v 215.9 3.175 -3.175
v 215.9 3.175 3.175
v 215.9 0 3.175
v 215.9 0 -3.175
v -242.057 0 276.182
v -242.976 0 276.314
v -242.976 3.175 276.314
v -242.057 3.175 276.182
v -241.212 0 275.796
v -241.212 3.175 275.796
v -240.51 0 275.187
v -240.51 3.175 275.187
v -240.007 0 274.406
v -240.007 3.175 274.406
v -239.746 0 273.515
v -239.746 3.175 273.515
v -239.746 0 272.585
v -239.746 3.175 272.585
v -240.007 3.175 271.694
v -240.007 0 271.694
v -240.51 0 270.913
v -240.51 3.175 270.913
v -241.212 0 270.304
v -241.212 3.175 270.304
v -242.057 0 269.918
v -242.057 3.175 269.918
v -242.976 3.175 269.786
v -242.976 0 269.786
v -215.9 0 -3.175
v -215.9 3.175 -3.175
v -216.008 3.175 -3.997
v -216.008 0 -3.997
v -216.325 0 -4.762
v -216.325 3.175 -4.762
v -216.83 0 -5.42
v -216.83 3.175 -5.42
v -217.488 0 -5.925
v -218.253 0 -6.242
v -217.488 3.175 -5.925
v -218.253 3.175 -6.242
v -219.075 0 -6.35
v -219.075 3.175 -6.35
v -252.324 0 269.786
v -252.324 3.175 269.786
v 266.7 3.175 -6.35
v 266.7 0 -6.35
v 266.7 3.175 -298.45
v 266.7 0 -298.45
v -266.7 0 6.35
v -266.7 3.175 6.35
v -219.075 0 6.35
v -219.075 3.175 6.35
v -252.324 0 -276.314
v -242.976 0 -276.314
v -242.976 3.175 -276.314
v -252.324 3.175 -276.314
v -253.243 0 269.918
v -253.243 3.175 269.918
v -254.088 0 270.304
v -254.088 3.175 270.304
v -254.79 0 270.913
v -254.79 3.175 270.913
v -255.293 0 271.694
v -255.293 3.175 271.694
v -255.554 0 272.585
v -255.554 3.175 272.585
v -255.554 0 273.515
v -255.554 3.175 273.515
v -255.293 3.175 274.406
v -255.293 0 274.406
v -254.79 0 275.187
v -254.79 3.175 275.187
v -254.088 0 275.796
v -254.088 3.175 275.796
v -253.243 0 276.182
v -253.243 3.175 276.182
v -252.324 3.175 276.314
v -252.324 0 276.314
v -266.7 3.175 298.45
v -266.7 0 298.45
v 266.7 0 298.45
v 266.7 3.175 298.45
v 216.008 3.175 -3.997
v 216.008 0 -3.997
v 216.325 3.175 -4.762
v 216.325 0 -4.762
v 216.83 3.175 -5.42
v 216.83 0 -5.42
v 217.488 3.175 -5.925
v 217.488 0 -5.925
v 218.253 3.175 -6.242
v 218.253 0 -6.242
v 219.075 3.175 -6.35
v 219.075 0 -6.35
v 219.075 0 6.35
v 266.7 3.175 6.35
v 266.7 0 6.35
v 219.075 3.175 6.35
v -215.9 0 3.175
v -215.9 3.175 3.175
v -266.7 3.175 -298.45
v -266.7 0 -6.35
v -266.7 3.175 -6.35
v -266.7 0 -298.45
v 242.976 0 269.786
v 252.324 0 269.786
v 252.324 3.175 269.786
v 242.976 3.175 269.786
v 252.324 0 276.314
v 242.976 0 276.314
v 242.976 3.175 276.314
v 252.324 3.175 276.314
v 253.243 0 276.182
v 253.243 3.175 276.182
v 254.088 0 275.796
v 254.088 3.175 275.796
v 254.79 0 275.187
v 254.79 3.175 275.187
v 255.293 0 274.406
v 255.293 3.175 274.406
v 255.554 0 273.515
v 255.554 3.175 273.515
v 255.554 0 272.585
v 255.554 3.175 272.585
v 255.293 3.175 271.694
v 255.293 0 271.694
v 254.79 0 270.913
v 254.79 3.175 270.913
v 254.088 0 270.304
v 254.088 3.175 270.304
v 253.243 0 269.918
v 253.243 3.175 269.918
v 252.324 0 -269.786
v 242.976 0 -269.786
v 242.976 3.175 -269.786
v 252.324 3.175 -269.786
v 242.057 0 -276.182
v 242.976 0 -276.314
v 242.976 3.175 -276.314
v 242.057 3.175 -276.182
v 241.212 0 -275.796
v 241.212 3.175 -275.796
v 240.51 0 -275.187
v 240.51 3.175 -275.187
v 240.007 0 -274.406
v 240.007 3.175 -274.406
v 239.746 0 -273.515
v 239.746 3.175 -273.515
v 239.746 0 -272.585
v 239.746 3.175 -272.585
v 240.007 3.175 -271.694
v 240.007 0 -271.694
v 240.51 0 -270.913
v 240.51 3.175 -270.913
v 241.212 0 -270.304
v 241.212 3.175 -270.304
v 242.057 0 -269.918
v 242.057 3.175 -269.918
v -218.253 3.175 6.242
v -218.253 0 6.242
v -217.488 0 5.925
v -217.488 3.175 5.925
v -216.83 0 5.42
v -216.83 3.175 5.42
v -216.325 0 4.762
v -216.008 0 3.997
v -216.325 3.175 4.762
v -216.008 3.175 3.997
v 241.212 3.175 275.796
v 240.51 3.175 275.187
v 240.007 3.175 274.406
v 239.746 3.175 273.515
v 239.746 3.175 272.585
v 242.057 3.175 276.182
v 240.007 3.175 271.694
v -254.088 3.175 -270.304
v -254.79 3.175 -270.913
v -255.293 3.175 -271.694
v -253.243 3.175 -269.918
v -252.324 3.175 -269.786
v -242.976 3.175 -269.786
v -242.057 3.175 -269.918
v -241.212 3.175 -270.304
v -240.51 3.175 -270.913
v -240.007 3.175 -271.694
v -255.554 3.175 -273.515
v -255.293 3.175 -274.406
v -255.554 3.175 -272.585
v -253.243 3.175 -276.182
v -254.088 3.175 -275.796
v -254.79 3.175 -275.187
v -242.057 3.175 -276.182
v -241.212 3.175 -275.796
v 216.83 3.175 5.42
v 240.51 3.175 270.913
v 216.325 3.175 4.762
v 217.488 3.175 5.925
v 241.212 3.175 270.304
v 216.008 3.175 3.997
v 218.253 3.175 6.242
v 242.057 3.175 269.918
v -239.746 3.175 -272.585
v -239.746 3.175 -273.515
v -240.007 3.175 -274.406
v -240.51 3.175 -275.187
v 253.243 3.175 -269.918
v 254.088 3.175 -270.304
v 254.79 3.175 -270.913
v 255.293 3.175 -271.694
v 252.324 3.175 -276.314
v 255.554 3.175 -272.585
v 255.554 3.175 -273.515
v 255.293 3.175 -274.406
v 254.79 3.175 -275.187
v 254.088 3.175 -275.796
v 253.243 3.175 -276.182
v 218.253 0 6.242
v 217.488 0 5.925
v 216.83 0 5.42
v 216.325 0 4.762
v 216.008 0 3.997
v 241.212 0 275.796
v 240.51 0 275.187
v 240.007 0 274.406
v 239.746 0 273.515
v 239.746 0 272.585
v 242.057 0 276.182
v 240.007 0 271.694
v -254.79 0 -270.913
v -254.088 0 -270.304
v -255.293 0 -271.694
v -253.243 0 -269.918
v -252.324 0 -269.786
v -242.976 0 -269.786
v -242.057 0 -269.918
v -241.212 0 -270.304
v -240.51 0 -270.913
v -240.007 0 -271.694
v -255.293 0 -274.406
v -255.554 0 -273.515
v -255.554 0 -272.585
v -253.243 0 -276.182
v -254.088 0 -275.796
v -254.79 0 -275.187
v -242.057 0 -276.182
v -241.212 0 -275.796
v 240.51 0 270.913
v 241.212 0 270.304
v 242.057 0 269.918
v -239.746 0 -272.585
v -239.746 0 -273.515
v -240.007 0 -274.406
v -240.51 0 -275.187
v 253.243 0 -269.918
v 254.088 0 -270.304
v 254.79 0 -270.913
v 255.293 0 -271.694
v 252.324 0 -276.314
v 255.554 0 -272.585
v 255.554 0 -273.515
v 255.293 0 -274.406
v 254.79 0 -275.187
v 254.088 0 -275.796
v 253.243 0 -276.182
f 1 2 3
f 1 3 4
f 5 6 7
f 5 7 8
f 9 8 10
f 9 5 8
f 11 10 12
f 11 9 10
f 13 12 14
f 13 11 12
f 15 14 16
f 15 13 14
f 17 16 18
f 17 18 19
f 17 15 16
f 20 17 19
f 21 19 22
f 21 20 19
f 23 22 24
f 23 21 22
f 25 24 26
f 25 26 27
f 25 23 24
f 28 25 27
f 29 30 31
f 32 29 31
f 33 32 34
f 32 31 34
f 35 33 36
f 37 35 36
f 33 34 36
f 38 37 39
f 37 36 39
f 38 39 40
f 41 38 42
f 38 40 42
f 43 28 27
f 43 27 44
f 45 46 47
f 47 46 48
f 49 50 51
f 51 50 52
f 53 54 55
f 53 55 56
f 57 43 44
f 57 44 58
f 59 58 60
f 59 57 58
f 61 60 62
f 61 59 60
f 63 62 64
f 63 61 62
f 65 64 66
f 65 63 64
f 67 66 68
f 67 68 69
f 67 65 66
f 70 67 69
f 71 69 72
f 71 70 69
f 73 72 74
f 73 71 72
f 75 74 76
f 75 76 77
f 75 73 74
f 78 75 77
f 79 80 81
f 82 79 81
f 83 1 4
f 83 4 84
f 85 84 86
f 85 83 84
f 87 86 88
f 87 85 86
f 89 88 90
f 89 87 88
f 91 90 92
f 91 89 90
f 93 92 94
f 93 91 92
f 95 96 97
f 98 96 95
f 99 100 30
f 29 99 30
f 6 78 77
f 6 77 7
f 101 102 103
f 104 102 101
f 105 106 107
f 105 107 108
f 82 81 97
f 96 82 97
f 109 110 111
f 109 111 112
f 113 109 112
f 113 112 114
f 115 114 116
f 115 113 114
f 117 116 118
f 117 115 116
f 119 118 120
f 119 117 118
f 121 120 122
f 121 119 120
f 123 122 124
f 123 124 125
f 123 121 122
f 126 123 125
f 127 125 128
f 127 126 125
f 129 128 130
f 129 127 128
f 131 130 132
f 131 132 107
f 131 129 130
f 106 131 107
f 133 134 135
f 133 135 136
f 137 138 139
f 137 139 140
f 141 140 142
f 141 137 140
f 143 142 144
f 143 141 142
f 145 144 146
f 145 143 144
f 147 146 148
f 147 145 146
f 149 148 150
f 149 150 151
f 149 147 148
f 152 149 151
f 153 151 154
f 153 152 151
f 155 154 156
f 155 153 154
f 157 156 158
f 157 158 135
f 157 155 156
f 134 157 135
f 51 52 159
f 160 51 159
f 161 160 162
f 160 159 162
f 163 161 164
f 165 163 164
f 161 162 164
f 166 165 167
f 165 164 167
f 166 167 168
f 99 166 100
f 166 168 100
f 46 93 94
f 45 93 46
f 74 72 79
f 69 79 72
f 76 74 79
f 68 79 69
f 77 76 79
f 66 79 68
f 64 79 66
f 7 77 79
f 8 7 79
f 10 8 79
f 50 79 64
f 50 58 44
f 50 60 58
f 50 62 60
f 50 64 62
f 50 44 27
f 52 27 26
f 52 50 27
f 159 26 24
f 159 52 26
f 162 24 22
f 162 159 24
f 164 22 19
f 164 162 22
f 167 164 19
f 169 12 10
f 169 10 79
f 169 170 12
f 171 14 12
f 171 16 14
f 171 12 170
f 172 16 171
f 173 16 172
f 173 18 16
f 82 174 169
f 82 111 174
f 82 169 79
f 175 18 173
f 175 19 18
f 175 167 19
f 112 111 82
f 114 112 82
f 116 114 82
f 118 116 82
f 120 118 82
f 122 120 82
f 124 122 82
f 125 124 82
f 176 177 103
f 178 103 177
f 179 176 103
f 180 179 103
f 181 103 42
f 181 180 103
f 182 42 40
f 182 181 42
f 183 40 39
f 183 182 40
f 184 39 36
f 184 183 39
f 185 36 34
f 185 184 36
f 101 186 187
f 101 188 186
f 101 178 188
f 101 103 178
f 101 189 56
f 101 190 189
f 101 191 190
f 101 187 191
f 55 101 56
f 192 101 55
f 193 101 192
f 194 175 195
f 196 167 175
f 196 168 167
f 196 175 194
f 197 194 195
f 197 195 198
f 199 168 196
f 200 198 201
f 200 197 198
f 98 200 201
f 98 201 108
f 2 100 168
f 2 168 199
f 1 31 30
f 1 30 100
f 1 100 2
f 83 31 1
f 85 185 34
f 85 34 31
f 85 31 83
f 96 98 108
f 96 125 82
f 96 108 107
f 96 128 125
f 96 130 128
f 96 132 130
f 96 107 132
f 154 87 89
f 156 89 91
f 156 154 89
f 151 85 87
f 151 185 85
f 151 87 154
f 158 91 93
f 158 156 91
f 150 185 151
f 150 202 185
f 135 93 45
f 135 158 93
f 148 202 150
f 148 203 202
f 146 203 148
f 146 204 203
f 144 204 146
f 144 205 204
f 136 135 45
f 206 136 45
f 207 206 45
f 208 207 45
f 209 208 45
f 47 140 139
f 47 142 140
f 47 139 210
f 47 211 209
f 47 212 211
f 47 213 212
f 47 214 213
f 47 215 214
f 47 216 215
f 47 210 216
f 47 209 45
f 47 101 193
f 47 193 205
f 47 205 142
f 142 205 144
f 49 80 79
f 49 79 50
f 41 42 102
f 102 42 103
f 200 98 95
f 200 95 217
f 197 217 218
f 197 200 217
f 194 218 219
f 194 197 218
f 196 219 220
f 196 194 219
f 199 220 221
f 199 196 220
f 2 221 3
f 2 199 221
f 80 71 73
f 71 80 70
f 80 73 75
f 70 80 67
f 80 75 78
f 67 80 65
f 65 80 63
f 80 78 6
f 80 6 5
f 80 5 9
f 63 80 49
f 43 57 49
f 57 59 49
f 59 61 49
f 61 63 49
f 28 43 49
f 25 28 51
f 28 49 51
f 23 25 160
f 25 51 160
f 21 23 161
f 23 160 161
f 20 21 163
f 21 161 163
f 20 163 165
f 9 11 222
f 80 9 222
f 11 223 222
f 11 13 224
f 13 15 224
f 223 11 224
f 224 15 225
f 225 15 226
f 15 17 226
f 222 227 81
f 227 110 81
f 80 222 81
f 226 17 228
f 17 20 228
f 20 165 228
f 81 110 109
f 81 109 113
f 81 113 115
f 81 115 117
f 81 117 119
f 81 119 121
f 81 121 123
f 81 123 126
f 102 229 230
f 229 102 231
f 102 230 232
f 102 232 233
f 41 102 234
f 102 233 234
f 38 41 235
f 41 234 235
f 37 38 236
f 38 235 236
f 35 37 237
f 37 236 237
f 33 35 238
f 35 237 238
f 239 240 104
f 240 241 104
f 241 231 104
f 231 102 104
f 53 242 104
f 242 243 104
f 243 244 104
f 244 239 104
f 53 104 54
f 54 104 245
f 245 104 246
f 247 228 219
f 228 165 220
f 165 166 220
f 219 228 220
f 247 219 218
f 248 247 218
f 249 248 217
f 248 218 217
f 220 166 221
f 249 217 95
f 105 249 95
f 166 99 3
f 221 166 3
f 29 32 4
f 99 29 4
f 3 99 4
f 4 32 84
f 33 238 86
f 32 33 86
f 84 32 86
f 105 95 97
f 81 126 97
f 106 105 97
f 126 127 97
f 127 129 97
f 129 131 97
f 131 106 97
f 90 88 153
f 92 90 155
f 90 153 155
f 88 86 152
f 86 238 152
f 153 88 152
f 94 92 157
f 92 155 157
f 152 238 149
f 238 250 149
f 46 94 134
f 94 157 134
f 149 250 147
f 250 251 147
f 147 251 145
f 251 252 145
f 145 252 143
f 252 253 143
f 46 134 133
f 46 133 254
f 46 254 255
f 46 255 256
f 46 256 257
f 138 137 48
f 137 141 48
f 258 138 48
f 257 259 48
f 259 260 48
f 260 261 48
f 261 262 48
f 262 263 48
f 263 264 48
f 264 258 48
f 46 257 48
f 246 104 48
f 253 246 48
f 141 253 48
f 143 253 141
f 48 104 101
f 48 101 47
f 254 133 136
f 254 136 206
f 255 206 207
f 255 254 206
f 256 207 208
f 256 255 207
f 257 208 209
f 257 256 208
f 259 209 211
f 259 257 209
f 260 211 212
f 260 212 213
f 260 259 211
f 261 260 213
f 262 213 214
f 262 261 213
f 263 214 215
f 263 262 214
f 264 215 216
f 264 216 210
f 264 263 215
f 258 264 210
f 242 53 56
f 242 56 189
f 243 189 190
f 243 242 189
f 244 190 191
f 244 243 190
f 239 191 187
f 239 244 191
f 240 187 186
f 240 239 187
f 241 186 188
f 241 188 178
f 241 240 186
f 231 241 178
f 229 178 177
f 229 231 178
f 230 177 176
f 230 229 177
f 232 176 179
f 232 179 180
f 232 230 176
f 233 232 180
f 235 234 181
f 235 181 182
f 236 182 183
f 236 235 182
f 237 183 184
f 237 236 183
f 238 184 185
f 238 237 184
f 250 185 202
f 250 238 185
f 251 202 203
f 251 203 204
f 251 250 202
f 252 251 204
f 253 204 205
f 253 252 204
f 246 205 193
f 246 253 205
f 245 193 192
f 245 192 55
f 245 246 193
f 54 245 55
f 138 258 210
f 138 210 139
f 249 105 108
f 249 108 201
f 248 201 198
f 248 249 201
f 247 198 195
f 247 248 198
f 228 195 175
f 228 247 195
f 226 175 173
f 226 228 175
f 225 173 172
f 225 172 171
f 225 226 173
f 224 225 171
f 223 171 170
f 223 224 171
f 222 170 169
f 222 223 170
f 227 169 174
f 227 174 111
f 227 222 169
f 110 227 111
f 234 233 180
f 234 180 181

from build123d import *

# Parameters (mm, degrees)
SKETCH1_W                    = 533.4
SKETCH1_H                    = 596.9
BOSS_EXTRUDE1_DEPTH          = 3.175
F_0_257_DIAMETER_SLOT1_DEPTH = 3.175
CUT_EXTRUDE1_DEPTH           = 401.264129201


# Read off the part's stored shape, not the designer's step: F (0.257) Diameter Slot1
with BuildPart() as part:
    # Sketch1 → Boss-Extrude1 (new body)
    with BuildSketch(Plane(origin=(0, 0, 0), x_dir=(1, 0, 0), z_dir=(0, 1, 0))):
        Rectangle(SKETCH1_W, SKETCH1_H)
    extrude(amount=BOSS_EXTRUDE1_DEPTH)

    # F (0.257) Diameter Slot1 outline → F (0.257) Diameter Slot1 (cut)
    with BuildSketch(Plane(origin=(0, 0, 0), x_dir=(1, 0, 0), z_dir=(0, 1, 0))):
        with BuildLine():
            Line((242.9764, -276.3139), (252.3236, -276.3139))
            ThreePointArc((252.3236, -276.3139), (255.5875, -273.05), (252.3236, -269.7861))
            Line((252.3236, -269.7861), (242.9764, -269.7861))
            ThreePointArc((242.9764, -269.7861), (239.7125, -273.05), (242.9764, -276.3139))
        make_face()
        with BuildLine():
            ThreePointArc((-242.9764, -276.3139), (-239.7125, -273.05), (-242.9764, -269.7861))
            Line((-242.9764, -269.7861), (-252.3236, -269.7861))
            ThreePointArc((-252.3236, -269.7861), (-255.5875, -273.05), (-252.3236, -276.3139))
            Line((-252.3236, -276.3139), (-242.9764, -276.3139))
        make_face()
        with BuildLine():
            Line((242.9764, 269.7861), (252.3236, 269.7861))
            ThreePointArc((252.3236, 269.7861), (255.5875, 273.05), (252.3236, 276.3139))
            Line((252.3236, 276.3139), (242.9764, 276.3139))
            ThreePointArc((242.9764, 276.3139), (239.7125, 273.05), (242.9764, 269.7861))
        make_face()
        with BuildLine():
            ThreePointArc((-242.9764, 269.7861), (-239.7125, 273.05), (-242.9764, 276.3139))
            Line((-242.9764, 276.3139), (-252.3236, 276.3139))
            ThreePointArc((-252.3236, 276.3139), (-255.5875, 273.05), (-252.3236, 269.7861))
            Line((-252.3236, 269.7861), (-242.9764, 269.7861))
        make_face()
    extrude(amount=F_0_257_DIAMETER_SLOT1_DEPTH, mode=Mode.SUBTRACT)

    # Sketch5 → Cut-Extrude1 (cut, through all)
    with BuildSketch(Plane(origin=(0, 3.175, 0), x_dir=(1, 0, 0), z_dir=(0, 1, 0))):
        with BuildLine():
            Line((219.075, 6.35), (266.7, 6.35))
            Line((266.7, 6.35), (266.7, -6.35))
            Line((266.7, -6.35), (219.075, -6.35))
            ThreePointArc((219.075, -6.35), (216.82993597, -5.42006403), (215.9, -3.175))
            Line((215.9, -3.175), (215.9, 3.175))
            ThreePointArc((215.9, 3.175), (216.82993597, 5.42006403), (219.075, 6.35))
        make_face()
        with BuildLine():
            Line((-266.7, 6.35), (-266.7, -6.35))
            Line((-266.7, -6.35), (-219.075, -6.35))
            ThreePointArc((-219.075, -6.35), (-216.82993597, -5.42006403), (-215.9, -3.175))
            Line((-215.9, -3.175), (-215.9, 3.175))
            ThreePointArc((-215.9, 3.175), (-216.82993597, 5.42006403), (-219.075, 6.35))
            Line((-219.075, 6.35), (-266.7, 6.35))
        make_face()
    extrude(amount=-CUT_EXTRUDE1_DEPTH, mode=Mode.SUBTRACT)


solid = part.part
